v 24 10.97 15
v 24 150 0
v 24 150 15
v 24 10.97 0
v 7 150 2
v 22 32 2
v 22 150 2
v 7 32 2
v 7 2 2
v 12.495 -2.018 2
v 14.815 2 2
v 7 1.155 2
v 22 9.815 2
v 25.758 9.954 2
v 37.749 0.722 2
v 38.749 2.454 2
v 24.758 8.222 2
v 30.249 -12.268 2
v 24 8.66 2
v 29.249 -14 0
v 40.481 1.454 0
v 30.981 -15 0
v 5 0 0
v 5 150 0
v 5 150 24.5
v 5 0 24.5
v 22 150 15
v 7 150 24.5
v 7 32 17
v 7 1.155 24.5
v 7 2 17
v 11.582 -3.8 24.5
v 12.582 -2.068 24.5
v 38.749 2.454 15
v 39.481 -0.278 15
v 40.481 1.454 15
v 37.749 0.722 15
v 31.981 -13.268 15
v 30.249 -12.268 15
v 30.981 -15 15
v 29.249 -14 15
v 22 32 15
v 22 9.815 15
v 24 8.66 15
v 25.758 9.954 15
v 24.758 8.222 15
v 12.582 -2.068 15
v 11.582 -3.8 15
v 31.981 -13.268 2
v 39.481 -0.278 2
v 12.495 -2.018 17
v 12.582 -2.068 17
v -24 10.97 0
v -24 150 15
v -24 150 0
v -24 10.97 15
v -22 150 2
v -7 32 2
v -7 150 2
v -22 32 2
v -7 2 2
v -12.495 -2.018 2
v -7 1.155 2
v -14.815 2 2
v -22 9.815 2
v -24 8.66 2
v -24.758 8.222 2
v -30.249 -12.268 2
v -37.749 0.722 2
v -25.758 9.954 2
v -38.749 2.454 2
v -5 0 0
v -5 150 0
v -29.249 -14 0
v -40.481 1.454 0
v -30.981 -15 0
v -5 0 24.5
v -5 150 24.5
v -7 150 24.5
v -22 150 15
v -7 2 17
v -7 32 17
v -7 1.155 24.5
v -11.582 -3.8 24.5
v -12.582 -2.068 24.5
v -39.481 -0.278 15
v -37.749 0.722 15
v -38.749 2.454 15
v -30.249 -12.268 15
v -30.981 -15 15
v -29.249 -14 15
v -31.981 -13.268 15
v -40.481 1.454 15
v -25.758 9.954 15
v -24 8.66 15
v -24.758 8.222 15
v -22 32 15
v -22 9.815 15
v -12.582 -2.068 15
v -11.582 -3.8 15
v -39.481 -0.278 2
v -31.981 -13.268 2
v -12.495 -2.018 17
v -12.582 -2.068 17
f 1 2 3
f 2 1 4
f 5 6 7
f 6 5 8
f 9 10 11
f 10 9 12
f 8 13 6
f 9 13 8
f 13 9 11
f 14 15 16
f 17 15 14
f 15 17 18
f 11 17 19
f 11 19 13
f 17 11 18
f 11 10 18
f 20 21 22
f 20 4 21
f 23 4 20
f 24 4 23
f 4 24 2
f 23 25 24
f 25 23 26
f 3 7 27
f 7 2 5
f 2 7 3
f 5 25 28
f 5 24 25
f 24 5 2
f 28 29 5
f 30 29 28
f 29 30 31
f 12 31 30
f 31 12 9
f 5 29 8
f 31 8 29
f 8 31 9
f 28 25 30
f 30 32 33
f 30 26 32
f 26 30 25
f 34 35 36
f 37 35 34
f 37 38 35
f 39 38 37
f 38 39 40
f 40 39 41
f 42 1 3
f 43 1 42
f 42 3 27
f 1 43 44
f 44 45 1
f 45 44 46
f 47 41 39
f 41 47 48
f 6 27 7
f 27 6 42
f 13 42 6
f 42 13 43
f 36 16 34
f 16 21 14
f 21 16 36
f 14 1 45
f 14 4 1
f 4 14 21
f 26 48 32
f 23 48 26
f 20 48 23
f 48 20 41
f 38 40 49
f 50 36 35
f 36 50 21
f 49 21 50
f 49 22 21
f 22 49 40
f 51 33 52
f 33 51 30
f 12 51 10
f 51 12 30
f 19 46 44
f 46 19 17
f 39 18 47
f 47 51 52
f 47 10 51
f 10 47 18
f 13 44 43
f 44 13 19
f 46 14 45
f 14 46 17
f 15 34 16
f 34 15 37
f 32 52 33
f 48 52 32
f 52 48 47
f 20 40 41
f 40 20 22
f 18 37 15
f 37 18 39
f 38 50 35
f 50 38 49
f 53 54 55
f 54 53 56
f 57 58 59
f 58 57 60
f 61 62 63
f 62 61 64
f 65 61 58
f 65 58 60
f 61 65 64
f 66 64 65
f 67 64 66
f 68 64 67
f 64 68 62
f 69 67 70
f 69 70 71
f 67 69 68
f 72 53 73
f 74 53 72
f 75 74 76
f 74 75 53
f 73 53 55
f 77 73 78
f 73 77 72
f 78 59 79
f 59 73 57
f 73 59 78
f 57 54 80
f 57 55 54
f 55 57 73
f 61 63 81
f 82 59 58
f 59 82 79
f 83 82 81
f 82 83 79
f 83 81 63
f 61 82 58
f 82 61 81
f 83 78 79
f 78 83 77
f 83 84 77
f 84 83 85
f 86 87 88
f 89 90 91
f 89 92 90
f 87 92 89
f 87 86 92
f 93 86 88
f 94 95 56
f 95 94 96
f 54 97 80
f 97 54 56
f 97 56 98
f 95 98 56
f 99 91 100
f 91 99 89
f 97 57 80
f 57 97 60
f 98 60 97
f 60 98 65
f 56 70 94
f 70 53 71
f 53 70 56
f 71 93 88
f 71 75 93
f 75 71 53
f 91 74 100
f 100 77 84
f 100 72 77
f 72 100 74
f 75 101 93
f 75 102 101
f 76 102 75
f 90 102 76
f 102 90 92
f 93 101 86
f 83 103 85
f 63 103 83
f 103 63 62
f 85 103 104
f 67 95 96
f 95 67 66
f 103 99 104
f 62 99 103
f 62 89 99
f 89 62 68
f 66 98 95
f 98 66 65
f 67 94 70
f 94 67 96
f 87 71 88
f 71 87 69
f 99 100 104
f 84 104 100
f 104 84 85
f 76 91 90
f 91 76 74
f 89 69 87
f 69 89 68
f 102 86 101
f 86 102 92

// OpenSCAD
// file: detail/battery.scad
module batteryAA()
{
  cylinder(h=48.5, r=14.5/2, $fs=0.1);
  translate([0,0, 48.5])
    cylinder(h=2, r=5.5/2, $fs=0.1);
}

module batteryAAA()
{
  cylinder(h=42.5, r=10.5/2, $fs=0.1);
  translate([0,0, 42.5])
    cylinder(h=1.5, r=4/2, $fs=0.1);
}

// just an exhibition - not used directly
translate([20,0,0])
  batteryAA();
translate([0,0,0])
  batteryAAA();
// file: detail/wing.scad
use <battery.scad>

surround        = 15;
height          = 150;
wall            = 2;
// following shall be defined before including module
//batteryDiameter = 20;
//batteryLength   = 40;

module channel(h)
{
  // side
  cube([2*wall+batteryDiameter, h, wall]);
  // back wall
  cube([wall, h, batteryLength/2]);
  // front holding
  translate([wall+batteryDiameter, 0, 0])
    cube([wall, h, surround]);
}

module wing()
{
  difference()
  {
    // main channel part
    union()
    {
      channel(height);
      rotate([0,0,60])
        translate([0, -2*batteryDiameter, 0])
          channel(2*batteryDiameter);
    }
    // removal of unnecessary elements
    translate([wall, wall, wall])
      cube([batteryDiameter, 2*batteryDiameter, surround]);
    rotate([0,0,60])
      translate([wall, -2*batteryDiameter, wall])
        cube([batteryDiameter, 1.5*batteryDiameter, surround]);
    // removal of part from which battery will be extracted
    rotate([0,0,60])
      translate([3*wall, -2*batteryDiameter+wall, wall])
        cube([batteryDiameter, batteryDiameter, surround]);
    // extra space on the bottom for the fingers to catch the battery easily
    rotate([0,0,60])
      translate([-0.1, -2*batteryDiameter-0.1, surround])
        cube([batteryDiameter, 1.5*batteryDiameter, batteryLength/2-surround]);
  }
  rotate([0,0,60])
    translate([0, -2*batteryDiameter, 0])
      cube([2*wall+batteryDiameter, wall, surround]);
}


// display only
if(false)
  for(m = [0,1])
    mirror([m,0,0])
      translate([5,0,0])
        wing();
// main file
batteryDiameter = 15;
batteryLength   = 49;
include <detail/wing.scad>


for(m = [0,1])
{
  mirror([m,0,0])
  {
    translate([5,0,0])
      wing();
    %translate([27, -3, 2+1])
      batteryAAA();
  }
}
